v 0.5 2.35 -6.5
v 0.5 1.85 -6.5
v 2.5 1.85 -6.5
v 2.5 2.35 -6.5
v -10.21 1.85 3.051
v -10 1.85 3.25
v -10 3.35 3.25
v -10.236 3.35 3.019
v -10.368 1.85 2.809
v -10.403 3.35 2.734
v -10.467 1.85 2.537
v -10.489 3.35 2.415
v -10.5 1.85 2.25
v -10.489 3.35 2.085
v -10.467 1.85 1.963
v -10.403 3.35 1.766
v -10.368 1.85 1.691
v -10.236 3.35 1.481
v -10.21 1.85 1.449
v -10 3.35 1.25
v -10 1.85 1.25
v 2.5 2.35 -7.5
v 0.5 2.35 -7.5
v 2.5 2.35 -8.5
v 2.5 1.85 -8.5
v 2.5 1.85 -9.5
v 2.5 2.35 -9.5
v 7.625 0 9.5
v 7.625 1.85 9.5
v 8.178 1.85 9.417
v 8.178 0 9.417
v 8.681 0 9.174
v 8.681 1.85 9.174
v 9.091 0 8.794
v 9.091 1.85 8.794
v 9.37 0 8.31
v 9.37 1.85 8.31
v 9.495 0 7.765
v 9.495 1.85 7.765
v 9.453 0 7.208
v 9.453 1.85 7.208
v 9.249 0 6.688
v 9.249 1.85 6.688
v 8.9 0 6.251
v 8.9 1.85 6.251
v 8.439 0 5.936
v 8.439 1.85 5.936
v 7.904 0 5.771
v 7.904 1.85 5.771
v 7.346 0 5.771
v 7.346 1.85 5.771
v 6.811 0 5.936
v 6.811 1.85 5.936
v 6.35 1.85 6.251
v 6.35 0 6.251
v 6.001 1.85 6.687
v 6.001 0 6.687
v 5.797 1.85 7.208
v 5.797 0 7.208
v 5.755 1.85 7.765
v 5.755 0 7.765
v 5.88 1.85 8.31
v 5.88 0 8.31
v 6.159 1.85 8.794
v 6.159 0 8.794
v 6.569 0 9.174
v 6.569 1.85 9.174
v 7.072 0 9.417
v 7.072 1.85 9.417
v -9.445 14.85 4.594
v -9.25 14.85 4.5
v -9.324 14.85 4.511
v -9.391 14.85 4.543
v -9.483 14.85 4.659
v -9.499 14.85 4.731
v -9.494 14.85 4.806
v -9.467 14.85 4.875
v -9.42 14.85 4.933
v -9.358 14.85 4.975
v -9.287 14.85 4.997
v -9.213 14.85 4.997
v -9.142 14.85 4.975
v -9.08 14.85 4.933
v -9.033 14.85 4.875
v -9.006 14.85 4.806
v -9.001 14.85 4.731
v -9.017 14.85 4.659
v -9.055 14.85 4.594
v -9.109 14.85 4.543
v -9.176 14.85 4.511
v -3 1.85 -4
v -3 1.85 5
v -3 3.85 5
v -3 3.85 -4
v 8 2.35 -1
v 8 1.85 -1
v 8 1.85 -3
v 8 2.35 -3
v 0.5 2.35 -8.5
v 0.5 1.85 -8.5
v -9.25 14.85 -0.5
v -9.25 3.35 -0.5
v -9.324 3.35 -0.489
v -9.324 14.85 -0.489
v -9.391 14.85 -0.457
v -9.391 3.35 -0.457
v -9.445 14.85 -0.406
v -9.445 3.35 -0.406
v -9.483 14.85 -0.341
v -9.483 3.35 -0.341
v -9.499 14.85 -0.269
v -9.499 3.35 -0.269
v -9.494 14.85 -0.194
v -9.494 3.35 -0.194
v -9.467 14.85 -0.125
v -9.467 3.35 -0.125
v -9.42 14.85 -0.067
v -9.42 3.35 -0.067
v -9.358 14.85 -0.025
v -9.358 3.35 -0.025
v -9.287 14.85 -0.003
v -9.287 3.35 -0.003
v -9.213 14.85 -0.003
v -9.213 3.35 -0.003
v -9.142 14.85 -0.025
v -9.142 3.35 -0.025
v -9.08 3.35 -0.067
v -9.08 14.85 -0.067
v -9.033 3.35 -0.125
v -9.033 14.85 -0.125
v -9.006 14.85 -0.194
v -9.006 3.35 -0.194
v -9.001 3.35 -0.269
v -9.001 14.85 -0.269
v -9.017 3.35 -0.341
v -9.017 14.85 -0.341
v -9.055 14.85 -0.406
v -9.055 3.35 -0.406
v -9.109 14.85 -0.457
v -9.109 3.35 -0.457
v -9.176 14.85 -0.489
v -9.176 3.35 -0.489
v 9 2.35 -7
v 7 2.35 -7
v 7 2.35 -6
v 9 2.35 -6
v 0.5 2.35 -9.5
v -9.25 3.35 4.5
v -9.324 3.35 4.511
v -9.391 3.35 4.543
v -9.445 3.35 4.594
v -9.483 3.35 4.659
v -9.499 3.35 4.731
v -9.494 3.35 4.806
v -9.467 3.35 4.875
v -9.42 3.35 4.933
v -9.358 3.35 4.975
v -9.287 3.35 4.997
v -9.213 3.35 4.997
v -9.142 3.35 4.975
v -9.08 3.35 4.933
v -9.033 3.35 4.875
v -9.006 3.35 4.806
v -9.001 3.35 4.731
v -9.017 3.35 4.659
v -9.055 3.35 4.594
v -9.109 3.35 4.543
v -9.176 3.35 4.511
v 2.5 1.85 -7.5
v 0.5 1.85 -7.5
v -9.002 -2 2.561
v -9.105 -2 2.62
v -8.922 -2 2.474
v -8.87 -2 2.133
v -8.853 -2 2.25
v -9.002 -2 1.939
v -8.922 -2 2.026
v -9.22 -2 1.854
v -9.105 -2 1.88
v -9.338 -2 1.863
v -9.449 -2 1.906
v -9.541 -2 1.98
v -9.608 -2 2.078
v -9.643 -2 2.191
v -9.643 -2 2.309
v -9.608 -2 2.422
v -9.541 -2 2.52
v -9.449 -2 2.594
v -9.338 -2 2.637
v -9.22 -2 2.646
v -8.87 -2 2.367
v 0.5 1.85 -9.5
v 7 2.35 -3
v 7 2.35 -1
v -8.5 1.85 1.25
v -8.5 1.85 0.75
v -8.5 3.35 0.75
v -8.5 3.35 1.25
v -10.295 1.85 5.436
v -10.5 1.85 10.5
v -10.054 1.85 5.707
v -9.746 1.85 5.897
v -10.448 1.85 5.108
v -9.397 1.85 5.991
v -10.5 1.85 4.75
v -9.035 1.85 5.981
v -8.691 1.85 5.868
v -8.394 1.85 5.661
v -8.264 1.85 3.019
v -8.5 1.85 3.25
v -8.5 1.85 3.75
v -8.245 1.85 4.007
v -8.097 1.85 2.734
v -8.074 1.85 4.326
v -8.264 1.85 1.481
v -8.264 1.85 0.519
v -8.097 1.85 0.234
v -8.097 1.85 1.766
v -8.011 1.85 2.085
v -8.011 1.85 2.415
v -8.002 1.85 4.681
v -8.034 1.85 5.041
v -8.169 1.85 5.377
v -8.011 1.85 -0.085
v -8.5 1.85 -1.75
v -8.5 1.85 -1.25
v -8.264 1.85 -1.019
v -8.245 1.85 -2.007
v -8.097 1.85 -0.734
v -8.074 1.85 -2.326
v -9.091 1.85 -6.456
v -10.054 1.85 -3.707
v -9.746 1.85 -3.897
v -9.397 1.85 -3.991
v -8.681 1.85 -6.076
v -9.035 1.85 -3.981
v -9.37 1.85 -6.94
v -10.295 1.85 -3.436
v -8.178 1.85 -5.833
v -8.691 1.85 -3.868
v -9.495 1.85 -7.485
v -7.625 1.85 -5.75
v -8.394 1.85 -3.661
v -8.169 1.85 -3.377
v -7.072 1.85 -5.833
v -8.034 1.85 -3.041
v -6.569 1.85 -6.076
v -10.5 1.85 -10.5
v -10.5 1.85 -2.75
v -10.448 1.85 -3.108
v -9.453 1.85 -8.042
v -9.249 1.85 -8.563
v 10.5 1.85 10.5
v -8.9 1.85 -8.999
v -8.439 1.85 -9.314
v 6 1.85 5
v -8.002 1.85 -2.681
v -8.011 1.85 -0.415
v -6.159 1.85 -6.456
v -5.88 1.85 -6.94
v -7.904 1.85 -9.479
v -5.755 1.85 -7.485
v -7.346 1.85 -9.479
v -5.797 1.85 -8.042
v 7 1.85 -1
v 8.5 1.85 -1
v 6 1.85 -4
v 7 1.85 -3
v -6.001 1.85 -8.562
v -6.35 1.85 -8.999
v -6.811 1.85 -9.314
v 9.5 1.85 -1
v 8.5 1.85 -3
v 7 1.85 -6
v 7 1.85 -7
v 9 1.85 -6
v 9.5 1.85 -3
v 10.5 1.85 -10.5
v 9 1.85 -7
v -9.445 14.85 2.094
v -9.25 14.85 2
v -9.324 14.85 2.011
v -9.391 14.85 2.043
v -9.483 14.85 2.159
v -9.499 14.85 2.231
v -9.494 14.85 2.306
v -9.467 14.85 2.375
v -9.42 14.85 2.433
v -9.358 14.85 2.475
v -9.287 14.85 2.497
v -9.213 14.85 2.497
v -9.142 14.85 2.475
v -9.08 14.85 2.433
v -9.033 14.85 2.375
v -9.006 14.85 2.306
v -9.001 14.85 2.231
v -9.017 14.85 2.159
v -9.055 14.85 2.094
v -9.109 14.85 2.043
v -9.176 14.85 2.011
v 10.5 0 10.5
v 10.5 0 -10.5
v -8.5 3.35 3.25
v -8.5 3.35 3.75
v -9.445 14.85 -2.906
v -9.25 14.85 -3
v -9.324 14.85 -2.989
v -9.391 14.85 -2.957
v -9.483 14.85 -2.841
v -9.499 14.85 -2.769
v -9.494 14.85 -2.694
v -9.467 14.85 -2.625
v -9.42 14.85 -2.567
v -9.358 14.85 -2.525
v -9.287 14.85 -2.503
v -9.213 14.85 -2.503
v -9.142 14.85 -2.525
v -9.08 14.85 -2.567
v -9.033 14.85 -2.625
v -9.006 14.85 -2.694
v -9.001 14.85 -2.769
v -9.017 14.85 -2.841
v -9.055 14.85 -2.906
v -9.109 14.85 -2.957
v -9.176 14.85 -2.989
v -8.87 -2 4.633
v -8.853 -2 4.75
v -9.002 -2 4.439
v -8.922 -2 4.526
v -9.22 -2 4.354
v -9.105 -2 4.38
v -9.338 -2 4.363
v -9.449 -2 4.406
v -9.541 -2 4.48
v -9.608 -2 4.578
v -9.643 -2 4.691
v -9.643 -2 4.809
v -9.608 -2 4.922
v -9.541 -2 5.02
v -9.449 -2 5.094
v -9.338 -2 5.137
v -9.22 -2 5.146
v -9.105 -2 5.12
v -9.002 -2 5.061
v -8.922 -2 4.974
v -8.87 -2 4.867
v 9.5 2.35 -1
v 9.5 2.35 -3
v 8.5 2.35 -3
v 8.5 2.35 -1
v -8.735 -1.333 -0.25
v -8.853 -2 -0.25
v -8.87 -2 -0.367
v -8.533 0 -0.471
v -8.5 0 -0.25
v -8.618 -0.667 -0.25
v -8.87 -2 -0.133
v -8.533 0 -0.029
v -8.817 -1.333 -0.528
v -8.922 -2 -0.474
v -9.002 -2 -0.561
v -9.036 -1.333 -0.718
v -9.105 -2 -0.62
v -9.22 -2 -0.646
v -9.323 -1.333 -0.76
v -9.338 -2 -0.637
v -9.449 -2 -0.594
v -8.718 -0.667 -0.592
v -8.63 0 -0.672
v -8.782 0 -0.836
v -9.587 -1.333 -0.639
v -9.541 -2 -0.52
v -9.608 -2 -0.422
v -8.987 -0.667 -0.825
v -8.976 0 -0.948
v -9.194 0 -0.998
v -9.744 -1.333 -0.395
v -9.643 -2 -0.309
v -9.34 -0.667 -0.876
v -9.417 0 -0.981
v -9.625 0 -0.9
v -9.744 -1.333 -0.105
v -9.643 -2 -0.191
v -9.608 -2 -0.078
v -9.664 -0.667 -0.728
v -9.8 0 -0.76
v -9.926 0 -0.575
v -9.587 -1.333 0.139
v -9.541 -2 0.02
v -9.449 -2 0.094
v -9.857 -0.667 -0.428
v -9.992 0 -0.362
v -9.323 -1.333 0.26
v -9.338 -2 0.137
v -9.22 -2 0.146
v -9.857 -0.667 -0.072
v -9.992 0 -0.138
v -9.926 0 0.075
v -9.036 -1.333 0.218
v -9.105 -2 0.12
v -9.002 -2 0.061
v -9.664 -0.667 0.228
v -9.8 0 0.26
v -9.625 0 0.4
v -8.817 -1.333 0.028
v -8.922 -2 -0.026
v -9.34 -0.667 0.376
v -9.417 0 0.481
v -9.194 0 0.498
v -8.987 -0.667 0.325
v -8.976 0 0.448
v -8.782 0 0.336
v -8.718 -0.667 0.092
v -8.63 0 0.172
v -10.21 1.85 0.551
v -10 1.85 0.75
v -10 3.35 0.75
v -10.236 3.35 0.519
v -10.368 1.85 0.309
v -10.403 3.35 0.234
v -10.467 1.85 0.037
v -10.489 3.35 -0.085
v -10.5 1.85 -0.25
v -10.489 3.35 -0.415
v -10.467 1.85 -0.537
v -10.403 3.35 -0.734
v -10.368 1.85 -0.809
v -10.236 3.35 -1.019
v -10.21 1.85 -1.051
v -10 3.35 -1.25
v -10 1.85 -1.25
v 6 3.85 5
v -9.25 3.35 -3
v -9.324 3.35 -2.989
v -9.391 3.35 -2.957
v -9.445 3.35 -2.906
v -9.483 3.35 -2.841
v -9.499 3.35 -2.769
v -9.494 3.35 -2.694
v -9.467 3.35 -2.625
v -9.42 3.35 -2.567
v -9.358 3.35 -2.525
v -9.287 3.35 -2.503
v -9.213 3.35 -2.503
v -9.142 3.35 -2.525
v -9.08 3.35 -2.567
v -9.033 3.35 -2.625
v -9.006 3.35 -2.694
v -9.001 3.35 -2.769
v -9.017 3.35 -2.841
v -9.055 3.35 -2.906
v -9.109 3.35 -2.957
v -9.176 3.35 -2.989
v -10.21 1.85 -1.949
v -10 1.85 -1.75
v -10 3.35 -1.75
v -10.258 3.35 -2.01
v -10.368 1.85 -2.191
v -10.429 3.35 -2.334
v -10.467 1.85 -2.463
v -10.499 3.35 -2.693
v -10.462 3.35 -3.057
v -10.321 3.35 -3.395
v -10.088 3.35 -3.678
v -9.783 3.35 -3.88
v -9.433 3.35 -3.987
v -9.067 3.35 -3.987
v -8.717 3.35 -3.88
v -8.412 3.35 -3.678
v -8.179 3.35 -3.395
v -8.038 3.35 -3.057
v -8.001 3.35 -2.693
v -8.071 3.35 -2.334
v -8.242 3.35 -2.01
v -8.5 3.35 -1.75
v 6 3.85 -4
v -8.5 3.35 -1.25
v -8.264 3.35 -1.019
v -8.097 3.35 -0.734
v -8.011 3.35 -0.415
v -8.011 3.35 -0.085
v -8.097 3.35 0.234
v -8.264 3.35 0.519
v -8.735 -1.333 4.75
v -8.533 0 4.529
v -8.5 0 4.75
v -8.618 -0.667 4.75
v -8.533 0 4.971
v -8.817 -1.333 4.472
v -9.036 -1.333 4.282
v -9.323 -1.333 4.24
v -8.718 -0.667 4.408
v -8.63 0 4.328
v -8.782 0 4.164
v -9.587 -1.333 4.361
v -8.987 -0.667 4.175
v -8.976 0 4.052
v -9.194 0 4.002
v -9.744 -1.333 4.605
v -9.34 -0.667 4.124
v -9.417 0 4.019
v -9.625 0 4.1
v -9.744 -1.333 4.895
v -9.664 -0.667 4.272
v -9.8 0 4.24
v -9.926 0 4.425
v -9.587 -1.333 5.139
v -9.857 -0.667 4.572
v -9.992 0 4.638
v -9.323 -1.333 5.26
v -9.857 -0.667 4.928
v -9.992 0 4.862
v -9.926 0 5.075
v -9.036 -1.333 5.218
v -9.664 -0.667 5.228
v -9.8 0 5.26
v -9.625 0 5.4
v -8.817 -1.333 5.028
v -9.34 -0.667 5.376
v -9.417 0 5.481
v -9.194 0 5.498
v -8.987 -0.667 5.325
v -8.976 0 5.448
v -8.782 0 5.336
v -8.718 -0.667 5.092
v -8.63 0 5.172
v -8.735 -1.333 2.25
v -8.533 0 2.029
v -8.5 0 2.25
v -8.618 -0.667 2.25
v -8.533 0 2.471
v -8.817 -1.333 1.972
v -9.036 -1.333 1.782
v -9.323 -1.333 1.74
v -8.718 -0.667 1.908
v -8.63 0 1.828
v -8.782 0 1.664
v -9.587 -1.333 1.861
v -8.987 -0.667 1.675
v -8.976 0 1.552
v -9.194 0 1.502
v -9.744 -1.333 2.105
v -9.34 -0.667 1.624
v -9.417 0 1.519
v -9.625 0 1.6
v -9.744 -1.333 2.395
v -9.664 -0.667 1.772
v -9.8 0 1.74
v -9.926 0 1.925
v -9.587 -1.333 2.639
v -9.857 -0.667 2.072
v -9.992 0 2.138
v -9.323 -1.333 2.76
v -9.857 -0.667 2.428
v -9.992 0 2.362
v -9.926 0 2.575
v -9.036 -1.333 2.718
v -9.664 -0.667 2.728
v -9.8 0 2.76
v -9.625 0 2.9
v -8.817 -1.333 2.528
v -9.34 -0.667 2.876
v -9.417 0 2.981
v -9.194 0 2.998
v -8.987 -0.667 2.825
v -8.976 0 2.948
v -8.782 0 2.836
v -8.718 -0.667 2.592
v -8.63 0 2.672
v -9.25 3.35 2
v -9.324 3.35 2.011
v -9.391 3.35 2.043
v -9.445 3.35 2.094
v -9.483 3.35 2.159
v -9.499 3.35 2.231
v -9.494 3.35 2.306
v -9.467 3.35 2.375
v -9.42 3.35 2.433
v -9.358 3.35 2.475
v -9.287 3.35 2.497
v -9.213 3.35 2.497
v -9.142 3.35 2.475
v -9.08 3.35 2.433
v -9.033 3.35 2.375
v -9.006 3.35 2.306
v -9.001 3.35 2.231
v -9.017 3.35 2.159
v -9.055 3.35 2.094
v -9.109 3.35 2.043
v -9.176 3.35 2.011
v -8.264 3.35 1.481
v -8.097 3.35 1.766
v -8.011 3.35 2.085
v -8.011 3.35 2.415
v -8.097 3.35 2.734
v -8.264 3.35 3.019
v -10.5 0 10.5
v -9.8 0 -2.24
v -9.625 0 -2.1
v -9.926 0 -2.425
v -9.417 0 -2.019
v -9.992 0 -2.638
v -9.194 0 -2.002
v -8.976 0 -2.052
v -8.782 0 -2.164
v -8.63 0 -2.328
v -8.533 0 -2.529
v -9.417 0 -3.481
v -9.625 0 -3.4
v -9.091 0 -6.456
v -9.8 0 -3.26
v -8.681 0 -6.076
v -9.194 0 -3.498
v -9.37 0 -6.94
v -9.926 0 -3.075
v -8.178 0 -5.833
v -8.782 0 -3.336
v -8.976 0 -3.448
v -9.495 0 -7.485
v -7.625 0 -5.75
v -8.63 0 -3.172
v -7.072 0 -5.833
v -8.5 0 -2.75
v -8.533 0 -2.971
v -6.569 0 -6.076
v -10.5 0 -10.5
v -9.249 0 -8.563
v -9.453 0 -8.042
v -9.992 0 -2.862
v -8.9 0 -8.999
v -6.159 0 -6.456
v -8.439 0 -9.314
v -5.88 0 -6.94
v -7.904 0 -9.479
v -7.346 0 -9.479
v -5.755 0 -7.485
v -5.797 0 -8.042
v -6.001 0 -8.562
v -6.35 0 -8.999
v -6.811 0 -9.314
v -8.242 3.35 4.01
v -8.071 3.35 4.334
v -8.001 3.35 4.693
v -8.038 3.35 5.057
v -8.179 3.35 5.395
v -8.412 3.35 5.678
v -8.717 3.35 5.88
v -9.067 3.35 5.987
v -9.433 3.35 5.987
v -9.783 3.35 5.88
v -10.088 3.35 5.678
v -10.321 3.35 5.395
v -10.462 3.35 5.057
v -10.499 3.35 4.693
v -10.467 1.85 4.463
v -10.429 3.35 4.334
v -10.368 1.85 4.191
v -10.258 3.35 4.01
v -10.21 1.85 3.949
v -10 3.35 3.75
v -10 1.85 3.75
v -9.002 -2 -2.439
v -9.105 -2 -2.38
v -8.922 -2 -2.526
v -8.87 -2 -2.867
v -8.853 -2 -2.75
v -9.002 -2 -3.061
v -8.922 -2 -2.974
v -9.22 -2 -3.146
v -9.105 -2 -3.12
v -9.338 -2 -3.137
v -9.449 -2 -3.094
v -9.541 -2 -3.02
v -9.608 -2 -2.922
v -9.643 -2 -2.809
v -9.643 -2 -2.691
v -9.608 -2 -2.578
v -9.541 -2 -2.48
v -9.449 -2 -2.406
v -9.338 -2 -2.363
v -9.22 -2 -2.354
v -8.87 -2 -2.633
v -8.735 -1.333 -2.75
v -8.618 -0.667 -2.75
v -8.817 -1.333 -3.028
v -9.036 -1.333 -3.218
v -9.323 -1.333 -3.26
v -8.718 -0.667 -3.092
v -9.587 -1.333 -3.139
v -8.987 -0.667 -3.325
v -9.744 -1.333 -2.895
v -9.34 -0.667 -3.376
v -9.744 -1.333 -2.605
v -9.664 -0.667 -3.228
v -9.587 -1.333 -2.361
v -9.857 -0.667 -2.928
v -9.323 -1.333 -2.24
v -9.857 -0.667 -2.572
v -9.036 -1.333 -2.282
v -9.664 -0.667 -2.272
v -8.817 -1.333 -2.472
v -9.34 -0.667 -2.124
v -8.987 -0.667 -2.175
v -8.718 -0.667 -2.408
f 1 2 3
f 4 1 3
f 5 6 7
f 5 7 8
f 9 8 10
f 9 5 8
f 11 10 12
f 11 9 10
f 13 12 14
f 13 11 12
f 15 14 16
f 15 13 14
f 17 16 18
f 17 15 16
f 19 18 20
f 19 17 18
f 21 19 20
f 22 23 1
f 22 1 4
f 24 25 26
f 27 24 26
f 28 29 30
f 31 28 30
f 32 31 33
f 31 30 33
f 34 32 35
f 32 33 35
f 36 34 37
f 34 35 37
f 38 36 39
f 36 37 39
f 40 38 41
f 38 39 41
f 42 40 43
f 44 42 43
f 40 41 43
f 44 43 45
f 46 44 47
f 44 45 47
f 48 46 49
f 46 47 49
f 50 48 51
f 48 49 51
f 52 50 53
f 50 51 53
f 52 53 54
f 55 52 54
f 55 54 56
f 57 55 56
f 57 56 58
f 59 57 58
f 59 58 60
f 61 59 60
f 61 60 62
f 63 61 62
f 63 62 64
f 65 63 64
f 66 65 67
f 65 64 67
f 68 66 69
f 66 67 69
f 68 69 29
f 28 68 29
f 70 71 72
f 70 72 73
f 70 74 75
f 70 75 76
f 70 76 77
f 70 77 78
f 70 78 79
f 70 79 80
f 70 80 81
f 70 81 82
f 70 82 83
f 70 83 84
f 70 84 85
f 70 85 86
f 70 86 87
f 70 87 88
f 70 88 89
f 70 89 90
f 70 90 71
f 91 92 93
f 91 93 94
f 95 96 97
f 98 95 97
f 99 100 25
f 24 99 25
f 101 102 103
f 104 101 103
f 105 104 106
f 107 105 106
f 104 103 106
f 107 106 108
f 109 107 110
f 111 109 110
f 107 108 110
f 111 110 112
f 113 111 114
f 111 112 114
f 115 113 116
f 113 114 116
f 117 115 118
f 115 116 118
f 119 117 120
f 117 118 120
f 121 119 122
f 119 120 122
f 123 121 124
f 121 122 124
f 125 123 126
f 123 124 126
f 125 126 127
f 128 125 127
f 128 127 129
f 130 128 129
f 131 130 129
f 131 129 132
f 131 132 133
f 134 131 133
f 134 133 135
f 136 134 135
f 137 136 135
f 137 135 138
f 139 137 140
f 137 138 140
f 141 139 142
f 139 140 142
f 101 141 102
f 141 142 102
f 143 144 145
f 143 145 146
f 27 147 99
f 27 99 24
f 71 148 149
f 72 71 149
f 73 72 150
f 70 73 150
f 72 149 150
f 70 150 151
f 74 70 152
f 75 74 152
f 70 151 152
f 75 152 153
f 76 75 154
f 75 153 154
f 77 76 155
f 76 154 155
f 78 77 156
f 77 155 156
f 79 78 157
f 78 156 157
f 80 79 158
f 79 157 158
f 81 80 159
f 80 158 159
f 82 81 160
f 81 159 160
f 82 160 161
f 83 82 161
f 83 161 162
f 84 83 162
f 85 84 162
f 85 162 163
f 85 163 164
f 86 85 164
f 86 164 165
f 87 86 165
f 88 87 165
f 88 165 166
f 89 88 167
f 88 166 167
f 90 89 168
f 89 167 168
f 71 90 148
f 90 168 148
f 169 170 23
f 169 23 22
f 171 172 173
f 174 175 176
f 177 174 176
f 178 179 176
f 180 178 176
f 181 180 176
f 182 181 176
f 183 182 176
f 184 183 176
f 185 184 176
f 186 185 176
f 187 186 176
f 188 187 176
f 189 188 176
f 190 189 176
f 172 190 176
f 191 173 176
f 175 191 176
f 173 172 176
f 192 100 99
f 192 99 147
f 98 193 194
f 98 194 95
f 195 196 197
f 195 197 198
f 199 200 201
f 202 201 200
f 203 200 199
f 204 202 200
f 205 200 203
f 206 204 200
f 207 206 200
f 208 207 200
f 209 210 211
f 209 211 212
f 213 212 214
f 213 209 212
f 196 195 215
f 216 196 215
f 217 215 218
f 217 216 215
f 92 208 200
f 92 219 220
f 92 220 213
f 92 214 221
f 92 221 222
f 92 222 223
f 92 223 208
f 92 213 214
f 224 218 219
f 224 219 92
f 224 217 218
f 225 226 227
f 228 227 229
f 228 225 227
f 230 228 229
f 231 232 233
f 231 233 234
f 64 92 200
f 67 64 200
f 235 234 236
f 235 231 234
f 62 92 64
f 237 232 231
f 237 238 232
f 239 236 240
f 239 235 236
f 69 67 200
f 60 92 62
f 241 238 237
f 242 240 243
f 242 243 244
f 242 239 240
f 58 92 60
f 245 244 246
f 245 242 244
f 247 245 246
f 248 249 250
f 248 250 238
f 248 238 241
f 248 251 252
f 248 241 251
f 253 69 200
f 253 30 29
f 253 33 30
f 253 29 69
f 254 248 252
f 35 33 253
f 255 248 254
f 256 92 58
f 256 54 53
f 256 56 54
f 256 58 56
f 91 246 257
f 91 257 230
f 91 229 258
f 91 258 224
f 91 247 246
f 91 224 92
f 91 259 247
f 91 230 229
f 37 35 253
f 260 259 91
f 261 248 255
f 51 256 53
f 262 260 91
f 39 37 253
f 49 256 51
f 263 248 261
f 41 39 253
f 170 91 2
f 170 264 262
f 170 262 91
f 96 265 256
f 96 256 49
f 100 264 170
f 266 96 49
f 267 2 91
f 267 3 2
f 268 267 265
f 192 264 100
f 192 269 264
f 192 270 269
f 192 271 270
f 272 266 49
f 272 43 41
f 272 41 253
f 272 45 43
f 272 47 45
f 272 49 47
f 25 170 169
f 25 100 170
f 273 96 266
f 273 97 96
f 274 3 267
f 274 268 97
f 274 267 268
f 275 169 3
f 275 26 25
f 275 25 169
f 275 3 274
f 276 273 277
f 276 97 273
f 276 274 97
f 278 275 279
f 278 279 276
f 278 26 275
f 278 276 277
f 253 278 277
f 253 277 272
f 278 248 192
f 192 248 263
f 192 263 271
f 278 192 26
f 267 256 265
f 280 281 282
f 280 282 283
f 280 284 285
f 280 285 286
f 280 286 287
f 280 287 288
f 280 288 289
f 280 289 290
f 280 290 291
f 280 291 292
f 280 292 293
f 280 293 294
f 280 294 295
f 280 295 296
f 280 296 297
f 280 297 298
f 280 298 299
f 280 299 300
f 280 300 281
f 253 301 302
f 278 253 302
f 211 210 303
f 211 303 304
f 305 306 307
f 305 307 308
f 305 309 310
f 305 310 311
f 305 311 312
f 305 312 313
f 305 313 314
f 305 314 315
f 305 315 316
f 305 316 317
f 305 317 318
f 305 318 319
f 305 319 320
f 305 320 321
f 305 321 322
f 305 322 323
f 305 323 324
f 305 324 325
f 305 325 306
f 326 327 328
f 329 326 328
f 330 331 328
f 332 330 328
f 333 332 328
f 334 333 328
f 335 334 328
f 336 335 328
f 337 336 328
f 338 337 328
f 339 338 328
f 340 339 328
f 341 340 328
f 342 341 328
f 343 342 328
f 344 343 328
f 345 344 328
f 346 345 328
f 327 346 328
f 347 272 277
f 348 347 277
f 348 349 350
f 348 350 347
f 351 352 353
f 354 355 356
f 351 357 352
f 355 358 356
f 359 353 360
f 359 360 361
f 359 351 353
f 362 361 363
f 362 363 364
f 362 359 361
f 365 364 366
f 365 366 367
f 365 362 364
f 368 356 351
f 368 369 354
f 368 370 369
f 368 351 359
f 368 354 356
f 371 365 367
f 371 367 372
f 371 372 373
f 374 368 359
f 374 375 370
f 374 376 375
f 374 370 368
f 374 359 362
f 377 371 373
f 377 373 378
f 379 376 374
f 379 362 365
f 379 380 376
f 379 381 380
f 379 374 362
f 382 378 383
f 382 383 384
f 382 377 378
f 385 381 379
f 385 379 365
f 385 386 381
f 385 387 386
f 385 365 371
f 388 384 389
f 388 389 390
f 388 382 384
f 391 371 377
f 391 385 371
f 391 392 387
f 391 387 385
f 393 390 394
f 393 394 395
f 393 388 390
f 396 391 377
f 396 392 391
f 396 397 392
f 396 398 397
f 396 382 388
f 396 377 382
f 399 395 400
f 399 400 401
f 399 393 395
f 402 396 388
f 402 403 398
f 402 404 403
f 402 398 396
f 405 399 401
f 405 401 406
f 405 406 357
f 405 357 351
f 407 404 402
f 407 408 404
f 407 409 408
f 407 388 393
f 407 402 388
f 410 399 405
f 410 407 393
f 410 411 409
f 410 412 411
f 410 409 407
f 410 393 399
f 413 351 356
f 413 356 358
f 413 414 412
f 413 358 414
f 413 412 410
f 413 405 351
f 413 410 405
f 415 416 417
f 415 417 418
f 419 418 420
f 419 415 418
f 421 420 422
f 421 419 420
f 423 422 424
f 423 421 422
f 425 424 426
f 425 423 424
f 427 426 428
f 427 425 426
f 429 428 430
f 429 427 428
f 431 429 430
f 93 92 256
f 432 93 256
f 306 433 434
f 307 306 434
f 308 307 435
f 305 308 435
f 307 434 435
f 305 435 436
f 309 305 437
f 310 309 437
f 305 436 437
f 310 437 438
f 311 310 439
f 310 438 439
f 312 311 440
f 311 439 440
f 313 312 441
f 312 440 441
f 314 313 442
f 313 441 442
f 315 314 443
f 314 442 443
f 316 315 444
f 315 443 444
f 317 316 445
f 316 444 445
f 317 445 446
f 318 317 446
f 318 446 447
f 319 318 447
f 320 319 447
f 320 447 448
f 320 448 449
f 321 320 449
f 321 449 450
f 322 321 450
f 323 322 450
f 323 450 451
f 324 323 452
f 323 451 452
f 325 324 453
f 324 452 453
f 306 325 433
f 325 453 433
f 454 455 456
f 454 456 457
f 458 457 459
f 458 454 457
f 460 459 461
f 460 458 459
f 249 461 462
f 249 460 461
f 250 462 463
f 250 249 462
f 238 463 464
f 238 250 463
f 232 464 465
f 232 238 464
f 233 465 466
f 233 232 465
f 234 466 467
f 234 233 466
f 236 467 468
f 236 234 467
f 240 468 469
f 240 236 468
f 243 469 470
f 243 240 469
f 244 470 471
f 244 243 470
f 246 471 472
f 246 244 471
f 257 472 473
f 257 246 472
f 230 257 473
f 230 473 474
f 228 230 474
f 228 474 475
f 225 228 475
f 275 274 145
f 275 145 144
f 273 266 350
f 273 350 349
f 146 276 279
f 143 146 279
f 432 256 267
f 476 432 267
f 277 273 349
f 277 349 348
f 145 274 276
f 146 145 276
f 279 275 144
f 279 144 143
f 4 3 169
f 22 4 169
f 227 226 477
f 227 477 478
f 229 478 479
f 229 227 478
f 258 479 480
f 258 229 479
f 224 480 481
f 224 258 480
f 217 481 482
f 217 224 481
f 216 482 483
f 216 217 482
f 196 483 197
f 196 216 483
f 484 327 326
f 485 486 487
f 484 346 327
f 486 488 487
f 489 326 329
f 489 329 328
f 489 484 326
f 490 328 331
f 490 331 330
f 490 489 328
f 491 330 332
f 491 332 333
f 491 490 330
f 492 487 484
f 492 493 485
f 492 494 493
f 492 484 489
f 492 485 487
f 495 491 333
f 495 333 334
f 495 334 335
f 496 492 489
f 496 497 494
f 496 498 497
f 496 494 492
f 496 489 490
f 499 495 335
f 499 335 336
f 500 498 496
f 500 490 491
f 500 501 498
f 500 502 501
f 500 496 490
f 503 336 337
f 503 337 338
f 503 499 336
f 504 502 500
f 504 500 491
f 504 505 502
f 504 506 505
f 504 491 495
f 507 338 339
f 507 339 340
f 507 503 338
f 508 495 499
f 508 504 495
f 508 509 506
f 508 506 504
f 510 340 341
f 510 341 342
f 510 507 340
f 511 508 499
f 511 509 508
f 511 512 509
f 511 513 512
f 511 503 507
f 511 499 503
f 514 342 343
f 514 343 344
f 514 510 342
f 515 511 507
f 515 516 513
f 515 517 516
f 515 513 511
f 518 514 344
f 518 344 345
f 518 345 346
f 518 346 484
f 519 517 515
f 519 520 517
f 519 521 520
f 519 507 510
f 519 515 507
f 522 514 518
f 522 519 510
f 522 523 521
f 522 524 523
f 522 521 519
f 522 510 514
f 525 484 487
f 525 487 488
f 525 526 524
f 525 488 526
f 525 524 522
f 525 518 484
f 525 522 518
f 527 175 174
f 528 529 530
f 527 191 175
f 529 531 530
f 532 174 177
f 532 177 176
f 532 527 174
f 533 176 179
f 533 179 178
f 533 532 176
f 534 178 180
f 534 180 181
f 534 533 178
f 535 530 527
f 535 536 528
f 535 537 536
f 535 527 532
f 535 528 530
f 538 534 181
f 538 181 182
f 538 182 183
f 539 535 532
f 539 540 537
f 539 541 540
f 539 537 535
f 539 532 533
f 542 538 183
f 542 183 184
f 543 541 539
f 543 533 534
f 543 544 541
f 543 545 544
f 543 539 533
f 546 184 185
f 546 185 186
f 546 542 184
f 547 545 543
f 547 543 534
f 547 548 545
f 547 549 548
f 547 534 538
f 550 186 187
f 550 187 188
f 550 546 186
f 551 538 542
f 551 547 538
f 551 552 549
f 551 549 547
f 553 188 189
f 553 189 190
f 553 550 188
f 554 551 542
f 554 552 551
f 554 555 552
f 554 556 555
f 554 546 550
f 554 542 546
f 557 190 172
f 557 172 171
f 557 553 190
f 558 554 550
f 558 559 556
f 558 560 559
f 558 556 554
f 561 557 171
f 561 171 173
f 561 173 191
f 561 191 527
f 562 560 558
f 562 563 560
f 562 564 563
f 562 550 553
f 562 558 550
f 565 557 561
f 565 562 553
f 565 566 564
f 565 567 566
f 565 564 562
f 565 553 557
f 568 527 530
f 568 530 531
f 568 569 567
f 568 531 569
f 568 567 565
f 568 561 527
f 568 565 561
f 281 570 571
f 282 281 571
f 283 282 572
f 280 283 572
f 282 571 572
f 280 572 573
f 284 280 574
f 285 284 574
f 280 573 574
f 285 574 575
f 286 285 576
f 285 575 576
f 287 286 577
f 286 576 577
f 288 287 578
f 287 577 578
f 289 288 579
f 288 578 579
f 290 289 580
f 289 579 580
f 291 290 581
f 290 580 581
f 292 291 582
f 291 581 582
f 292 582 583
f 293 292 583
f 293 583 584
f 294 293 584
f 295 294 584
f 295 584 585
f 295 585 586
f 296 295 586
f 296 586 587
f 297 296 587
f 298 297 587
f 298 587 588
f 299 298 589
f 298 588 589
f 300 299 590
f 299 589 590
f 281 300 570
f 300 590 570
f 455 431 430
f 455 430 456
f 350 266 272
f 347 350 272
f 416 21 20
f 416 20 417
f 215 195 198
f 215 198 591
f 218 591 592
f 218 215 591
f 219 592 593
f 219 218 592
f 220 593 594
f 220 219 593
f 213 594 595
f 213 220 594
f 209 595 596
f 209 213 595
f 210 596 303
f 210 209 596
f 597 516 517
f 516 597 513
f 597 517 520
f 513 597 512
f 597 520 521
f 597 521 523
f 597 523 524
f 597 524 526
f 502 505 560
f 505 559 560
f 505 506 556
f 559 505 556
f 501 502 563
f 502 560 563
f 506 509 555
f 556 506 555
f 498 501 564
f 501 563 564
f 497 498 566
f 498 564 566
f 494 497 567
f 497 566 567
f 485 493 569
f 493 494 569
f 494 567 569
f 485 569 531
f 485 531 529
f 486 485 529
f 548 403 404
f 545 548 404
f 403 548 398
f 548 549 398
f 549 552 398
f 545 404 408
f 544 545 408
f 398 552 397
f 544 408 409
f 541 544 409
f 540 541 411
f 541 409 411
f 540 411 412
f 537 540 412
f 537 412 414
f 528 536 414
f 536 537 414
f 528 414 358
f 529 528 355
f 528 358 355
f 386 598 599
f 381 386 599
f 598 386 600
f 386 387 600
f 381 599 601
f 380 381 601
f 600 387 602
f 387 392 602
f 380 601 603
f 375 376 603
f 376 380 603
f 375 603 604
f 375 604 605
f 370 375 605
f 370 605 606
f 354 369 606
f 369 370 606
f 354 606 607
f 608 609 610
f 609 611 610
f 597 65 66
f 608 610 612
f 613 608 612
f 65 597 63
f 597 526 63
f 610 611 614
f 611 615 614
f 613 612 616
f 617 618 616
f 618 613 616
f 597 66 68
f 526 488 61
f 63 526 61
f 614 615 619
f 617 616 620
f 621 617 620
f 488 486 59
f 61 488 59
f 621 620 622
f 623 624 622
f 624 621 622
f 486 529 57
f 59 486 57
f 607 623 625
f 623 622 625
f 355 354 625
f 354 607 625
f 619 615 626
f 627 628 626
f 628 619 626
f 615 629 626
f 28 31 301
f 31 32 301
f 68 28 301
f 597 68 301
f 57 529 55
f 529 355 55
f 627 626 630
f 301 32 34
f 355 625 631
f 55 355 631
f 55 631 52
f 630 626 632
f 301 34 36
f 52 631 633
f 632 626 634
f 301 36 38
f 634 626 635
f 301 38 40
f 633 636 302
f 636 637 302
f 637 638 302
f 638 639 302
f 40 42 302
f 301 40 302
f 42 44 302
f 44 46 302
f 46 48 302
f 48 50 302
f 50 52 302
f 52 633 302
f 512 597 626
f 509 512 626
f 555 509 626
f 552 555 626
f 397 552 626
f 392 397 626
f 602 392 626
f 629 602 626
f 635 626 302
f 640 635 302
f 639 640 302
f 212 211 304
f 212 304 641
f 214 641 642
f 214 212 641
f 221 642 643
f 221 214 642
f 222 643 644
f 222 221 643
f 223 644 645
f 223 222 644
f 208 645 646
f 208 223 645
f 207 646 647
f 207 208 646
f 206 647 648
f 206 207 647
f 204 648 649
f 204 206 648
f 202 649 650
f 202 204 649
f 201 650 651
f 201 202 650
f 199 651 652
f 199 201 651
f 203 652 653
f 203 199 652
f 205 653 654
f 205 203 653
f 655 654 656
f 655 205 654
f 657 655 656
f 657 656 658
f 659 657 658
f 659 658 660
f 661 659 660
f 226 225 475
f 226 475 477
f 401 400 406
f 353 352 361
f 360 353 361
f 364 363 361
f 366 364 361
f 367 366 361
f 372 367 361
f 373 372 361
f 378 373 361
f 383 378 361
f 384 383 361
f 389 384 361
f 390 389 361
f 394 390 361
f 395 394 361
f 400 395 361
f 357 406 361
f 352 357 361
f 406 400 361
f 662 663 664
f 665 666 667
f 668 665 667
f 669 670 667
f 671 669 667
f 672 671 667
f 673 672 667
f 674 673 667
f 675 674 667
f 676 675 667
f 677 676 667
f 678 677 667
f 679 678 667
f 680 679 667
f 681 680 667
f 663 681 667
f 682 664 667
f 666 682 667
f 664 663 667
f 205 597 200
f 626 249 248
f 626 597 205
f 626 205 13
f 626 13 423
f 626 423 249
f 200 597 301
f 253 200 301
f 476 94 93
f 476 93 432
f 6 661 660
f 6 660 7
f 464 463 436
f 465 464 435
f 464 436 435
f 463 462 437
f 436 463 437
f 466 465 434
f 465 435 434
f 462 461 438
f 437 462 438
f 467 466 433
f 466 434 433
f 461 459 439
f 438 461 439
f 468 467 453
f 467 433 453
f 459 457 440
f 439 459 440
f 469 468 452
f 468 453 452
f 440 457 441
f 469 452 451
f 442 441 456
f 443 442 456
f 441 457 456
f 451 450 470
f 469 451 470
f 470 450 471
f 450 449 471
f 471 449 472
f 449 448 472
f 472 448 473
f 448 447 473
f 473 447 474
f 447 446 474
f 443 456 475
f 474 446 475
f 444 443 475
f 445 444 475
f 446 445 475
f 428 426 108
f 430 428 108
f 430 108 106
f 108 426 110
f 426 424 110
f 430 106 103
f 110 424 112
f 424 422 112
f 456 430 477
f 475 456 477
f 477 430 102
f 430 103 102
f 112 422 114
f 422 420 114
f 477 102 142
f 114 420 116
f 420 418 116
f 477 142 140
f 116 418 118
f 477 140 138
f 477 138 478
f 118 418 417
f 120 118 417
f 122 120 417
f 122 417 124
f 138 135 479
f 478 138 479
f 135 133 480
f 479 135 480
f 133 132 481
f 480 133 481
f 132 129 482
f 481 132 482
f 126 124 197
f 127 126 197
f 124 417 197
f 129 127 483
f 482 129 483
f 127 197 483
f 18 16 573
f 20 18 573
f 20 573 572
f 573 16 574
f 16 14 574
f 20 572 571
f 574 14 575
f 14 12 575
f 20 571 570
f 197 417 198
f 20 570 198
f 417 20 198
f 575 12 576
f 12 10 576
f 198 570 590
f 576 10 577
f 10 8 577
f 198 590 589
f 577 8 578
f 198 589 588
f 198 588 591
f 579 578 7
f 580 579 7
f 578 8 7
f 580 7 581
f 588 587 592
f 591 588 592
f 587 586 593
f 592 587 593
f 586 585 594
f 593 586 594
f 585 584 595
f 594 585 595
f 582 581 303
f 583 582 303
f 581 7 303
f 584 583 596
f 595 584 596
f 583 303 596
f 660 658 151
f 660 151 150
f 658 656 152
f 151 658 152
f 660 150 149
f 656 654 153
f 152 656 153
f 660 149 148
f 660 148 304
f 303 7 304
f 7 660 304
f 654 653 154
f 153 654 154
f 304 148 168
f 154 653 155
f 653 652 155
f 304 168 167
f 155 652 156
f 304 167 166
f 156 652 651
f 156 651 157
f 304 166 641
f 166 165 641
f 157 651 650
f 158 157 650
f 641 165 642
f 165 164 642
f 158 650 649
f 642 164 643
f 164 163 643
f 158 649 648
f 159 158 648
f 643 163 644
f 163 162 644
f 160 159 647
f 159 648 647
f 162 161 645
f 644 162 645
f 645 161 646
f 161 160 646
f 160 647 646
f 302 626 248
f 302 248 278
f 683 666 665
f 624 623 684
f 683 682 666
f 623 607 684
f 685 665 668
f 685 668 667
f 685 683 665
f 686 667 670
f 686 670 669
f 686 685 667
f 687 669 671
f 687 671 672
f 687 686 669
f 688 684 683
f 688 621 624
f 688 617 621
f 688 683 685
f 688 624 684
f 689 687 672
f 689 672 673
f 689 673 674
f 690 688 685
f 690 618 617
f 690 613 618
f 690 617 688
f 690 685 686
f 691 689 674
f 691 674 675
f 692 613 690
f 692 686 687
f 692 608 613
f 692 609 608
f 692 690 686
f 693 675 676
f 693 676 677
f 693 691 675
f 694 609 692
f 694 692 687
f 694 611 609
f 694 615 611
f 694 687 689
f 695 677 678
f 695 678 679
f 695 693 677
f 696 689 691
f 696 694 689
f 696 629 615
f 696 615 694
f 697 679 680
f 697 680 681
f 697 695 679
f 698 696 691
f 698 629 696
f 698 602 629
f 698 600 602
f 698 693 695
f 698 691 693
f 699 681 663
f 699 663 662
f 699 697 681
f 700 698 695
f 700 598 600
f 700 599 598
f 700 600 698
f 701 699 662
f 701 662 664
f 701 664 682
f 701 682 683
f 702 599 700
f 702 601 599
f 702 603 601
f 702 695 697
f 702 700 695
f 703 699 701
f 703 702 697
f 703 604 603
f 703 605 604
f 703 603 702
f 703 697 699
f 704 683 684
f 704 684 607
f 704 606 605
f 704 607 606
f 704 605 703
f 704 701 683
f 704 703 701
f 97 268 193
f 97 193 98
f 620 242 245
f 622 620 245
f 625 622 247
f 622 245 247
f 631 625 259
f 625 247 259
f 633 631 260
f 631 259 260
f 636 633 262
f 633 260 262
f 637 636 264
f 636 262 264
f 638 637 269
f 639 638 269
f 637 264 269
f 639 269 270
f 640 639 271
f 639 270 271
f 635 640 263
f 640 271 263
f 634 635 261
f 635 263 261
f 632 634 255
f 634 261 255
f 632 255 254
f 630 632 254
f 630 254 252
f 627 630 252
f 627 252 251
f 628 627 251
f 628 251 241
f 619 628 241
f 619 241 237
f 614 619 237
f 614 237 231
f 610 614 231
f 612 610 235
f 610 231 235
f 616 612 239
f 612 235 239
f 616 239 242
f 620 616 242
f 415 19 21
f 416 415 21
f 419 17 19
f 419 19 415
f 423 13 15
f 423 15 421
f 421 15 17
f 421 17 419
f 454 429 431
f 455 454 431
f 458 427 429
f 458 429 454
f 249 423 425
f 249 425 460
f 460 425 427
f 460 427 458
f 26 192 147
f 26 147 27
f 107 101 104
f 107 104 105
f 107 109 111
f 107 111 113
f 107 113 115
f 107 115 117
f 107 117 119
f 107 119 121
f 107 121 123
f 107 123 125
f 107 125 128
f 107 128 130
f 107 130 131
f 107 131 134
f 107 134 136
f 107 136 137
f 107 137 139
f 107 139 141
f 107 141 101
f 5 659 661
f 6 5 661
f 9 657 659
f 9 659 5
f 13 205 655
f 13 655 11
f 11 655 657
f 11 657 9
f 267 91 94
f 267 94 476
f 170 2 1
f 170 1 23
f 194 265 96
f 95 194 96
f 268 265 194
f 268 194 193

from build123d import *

# Parameters (mm, degrees)
SKETCH1_W                     = 21
SKETCH1_H                     = 21
BOSS_EXTRUDE1_DEPTH           = 1.85
SKETCH2_W                     = 9
SKETCH2_H                     = 9
BOSS_EXTRUDE2_DEPTH           = 2
SKETCH3_R                     = 1.875
CUT_EXTRUDE1_DEPTH            = 1.85
SKETCH4_W                     = 2
SKETCH4_H                     = 1
SKETCH4_W_2                   = 1
SKETCH4_H_2                   = 2
BOSS_EXTRUDE3_DEPTH           = 0.5
SKETCH5_R                     = 0.75
BOSS_EXTRUDE4_DEPTH           = 2
BOSS_EXTRUDE4_DRAFT           = -10
BOSS_EXTRUDE4_PROFILE_2_DEPTH = 2
BOSS_EXTRUDE4_PROFILE_2_DRAFT = -10
BOSS_EXTRUDE4_PROFILE_3_DEPTH = 2
BOSS_EXTRUDE4_PROFILE_3_DRAFT = -10
BOSS_EXTRUDE4_PROFILE_4_DEPTH = 2
BOSS_EXTRUDE4_PROFILE_4_DRAFT = -10
BOSS_EXTRUDE5_DEPTH           = 1.5
SKETCH7_R                     = 0.25
BOSS_EXTRUDE6_DEPTH           = 11.5


with BuildPart() as part:
    # Sketch1 → Boss-Extrude1 (new body)
    with BuildSketch(Plane(origin=(0, 0, 0), x_dir=(1, 0, 0), z_dir=(0, 1, 0))):
        Rectangle(SKETCH1_W, SKETCH1_H)
    extrude(amount=BOSS_EXTRUDE1_DEPTH)

    # Sketch2 → Boss-Extrude2 (add)
    with BuildSketch(Plane(origin=(0, 1.85, 0), x_dir=(1, 0, 0), z_dir=(0, 1, 0))):
        with Locations((1.5, -0.5)):
            Rectangle(SKETCH2_W, SKETCH2_H)
    extrude(amount=BOSS_EXTRUDE2_DEPTH)

    # Sketch3 → Cut-Extrude1 (cut)
    with BuildSketch(Plane(origin=(0, 1.85, 0), x_dir=(1, 0, 0), z_dir=(0, 1, 0))):
        with Locations(Location((7.625, -7.625, 0), (0, 0, 270))):
            Circle(SKETCH3_R)
        with Locations(Location((-7.625, 7.625, 0), (0, 0, 270))):
            Circle(SKETCH3_R)
    extrude(amount=-CUT_EXTRUDE1_DEPTH, mode=Mode.SUBTRACT)

    # Sketch4 → Boss-Extrude3 (add)
    with BuildSketch(Plane(origin=(0, 1.85, 0), x_dir=(1, 0, 0), z_dir=(0, 1, 0))):
        with Locations((1.5, 9)):
            Rectangle(SKETCH4_W, SKETCH4_H)
        with Locations((1.5, 7)):
            Rectangle(SKETCH4_W, SKETCH4_H)
        with Locations((8, 6.5)):
            Rectangle(SKETCH4_W, SKETCH4_H)
        with Locations((7.5, 2)):
            Rectangle(SKETCH4_W_2, SKETCH4_H_2)
        with Locations((9, 2)):
            Rectangle(SKETCH4_W_2, SKETCH4_H_2)
    extrude(amount=BOSS_EXTRUDE3_DEPTH)


with BuildPart() as boss_extrude4_tool:
    # Sketch5 → Boss-Extrude4 (with draft: the straight prism first)
    with BuildSketch(Plane(origin=(0, 0, 0), x_dir=(1, 0, 0), z_dir=(0, 1, 0))):
        with Locations((-9.25, 2.75)):
            Circle(SKETCH5_R)
    extrude(amount=-BOSS_EXTRUDE4_DEPTH)
    # Boss-Extrude4: the draft: its side faces are tilted about the plane it starts from
    boss_extrude4_sides = [boss_extrude4_tool.faces().sort_by_distance(p)[0] for p in [
        (-10, -1, -2.75),
    ]]
    draft(boss_extrude4_sides, Plane(origin=(0, 0, 0), x_dir=(1, 0, 0), z_dir=(0, 1, 0)), BOSS_EXTRUDE4_DRAFT)


with BuildPart() as part_1:
    add(part.part)

    # Boss-Extrude4: add boss_extrude4_tool
    add(boss_extrude4_tool.part)


with BuildPart() as boss_extrude4_profile_2_tool:
    # Sketch5 → Boss-Extrude4 profile 2 (with draft: the straight prism first)
    with BuildSketch(Plane(origin=(0, 0, 0), x_dir=(1, 0, 0), z_dir=(0, 1, 0))):
        with Locations((-9.25, 0.25)):
            Circle(SKETCH5_R)
    extrude(amount=-BOSS_EXTRUDE4_PROFILE_2_DEPTH)
    # Boss-Extrude4 profile 2: the draft: its side faces are tilted about the plane it starts from
    boss_extrude4_profile_2_sides = [boss_extrude4_profile_2_tool.faces().sort_by_distance(p)[0] for p in [
        (-10, -1, -0.25),
    ]]
    draft(boss_extrude4_profile_2_sides, Plane(origin=(0, 0, 0), x_dir=(1, 0, 0), z_dir=(0, 1, 0)), BOSS_EXTRUDE4_PROFILE_2_DRAFT)


with BuildPart() as part_2:
    add(part_1.part)

    # Boss-Extrude4 profile 2: add boss_extrude4_profile_2_tool
    add(boss_extrude4_profile_2_tool.part)


with BuildPart() as boss_extrude4_profile_3_tool:
    # Sketch5 → Boss-Extrude4 profile 3 (with draft: the straight prism first)
    with BuildSketch(Plane(origin=(0, 0, 0), x_dir=(1, 0, 0), z_dir=(0, 1, 0))):
        with Locations((-9.25, -2.25)):
            Circle(SKETCH5_R)
    extrude(amount=-BOSS_EXTRUDE4_PROFILE_3_DEPTH)
    # Boss-Extrude4 profile 3: the draft: its side faces are tilted about the plane it starts from
    boss_extrude4_profile_3_sides = [boss_extrude4_profile_3_tool.faces().sort_by_distance(p)[0] for p in [
        (-10, -1, 2.25),
    ]]
    draft(boss_extrude4_profile_3_sides, Plane(origin=(0, 0, 0), x_dir=(1, 0, 0), z_dir=(0, 1, 0)), BOSS_EXTRUDE4_PROFILE_3_DRAFT)


with BuildPart() as part_3:
    add(part_2.part)

    # Boss-Extrude4 profile 3: add boss_extrude4_profile_3_tool
    add(boss_extrude4_profile_3_tool.part)


with BuildPart() as boss_extrude4_profile_4_tool:
    # Sketch5 → Boss-Extrude4 profile 4 (with draft: the straight prism first)
    with BuildSketch(Plane(origin=(0, 0, 0), x_dir=(1, 0, 0), z_dir=(0, 1, 0))):
        with Locations((-9.25, -4.75)):
            Circle(SKETCH5_R)
    extrude(amount=-BOSS_EXTRUDE4_PROFILE_4_DEPTH)
    # Boss-Extrude4 profile 4: the draft: its side faces are tilted about the plane it starts from
    boss_extrude4_profile_4_sides = [boss_extrude4_profile_4_tool.faces().sort_by_distance(p)[0] for p in [
        (-10, -1, 4.75),
    ]]
    draft(boss_extrude4_profile_4_sides, Plane(origin=(0, 0, 0), x_dir=(1, 0, 0), z_dir=(0, 1, 0)), BOSS_EXTRUDE4_PROFILE_4_DRAFT)


with BuildPart() as part_4:
    add(part_3.part)

    # Boss-Extrude4 profile 4: add boss_extrude4_profile_4_tool
    add(boss_extrude4_profile_4_tool.part)

    # Sketch6 → Boss-Extrude5 (add)
    with BuildSketch(Plane.XZ.offset(-1.85)):
        with BuildLine():
            Line((-10, -1.25), (-10, -1.75))
            ThreePointArc((-10, -1.75), (-9.25, -4), (-8.5, -1.75))
            Line((-8.5, -1.75), (-8.5, -1.25))
            ThreePointArc((-8.5, -1.25), (-8, -0.25), (-8.5, 0.75))
            Line((-8.5, 0.75), (-8.5, 1.25))
            ThreePointArc((-8.5, 1.25), (-8, 2.25), (-8.5, 3.25))
            Line((-8.5, 3.25), (-8.5, 3.75))
            ThreePointArc((-8.5, 3.75), (-9.25, 6), (-10, 3.75))
            Line((-10, 3.75), (-10, 3.25))
            ThreePointArc((-10, 3.25), (-10.5, 2.25), (-10, 1.25))
            Line((-10, 1.25), (-10, 0.75))
            ThreePointArc((-10, 0.75), (-10.5, -0.25), (-10, -1.25))
        make_face()
    extrude(amount=-BOSS_EXTRUDE5_DEPTH)

    # Sketch7 → Boss-Extrude6 (add)
    with BuildSketch(Plane(origin=(0, 3.35, 0), x_dir=(-1, 0, 0), z_dir=(0, 1, 0))):
        with Locations(Location((9.25, -2.75, 0), (0, 0, 270))):
            Circle(SKETCH7_R)
        with Locations(Location((9.25, -0.25, 0), (0, 0, 270))):
            Circle(SKETCH7_R)
        with Locations(Location((9.25, 2.25, 0), (0, 0, 270))):
            Circle(SKETCH7_R)
        with Locations(Location((9.25, 4.75, 0), (0, 0, 270))):
            Circle(SKETCH7_R)
    extrude(amount=BOSS_EXTRUDE6_DEPTH)


solid = part_4.part
